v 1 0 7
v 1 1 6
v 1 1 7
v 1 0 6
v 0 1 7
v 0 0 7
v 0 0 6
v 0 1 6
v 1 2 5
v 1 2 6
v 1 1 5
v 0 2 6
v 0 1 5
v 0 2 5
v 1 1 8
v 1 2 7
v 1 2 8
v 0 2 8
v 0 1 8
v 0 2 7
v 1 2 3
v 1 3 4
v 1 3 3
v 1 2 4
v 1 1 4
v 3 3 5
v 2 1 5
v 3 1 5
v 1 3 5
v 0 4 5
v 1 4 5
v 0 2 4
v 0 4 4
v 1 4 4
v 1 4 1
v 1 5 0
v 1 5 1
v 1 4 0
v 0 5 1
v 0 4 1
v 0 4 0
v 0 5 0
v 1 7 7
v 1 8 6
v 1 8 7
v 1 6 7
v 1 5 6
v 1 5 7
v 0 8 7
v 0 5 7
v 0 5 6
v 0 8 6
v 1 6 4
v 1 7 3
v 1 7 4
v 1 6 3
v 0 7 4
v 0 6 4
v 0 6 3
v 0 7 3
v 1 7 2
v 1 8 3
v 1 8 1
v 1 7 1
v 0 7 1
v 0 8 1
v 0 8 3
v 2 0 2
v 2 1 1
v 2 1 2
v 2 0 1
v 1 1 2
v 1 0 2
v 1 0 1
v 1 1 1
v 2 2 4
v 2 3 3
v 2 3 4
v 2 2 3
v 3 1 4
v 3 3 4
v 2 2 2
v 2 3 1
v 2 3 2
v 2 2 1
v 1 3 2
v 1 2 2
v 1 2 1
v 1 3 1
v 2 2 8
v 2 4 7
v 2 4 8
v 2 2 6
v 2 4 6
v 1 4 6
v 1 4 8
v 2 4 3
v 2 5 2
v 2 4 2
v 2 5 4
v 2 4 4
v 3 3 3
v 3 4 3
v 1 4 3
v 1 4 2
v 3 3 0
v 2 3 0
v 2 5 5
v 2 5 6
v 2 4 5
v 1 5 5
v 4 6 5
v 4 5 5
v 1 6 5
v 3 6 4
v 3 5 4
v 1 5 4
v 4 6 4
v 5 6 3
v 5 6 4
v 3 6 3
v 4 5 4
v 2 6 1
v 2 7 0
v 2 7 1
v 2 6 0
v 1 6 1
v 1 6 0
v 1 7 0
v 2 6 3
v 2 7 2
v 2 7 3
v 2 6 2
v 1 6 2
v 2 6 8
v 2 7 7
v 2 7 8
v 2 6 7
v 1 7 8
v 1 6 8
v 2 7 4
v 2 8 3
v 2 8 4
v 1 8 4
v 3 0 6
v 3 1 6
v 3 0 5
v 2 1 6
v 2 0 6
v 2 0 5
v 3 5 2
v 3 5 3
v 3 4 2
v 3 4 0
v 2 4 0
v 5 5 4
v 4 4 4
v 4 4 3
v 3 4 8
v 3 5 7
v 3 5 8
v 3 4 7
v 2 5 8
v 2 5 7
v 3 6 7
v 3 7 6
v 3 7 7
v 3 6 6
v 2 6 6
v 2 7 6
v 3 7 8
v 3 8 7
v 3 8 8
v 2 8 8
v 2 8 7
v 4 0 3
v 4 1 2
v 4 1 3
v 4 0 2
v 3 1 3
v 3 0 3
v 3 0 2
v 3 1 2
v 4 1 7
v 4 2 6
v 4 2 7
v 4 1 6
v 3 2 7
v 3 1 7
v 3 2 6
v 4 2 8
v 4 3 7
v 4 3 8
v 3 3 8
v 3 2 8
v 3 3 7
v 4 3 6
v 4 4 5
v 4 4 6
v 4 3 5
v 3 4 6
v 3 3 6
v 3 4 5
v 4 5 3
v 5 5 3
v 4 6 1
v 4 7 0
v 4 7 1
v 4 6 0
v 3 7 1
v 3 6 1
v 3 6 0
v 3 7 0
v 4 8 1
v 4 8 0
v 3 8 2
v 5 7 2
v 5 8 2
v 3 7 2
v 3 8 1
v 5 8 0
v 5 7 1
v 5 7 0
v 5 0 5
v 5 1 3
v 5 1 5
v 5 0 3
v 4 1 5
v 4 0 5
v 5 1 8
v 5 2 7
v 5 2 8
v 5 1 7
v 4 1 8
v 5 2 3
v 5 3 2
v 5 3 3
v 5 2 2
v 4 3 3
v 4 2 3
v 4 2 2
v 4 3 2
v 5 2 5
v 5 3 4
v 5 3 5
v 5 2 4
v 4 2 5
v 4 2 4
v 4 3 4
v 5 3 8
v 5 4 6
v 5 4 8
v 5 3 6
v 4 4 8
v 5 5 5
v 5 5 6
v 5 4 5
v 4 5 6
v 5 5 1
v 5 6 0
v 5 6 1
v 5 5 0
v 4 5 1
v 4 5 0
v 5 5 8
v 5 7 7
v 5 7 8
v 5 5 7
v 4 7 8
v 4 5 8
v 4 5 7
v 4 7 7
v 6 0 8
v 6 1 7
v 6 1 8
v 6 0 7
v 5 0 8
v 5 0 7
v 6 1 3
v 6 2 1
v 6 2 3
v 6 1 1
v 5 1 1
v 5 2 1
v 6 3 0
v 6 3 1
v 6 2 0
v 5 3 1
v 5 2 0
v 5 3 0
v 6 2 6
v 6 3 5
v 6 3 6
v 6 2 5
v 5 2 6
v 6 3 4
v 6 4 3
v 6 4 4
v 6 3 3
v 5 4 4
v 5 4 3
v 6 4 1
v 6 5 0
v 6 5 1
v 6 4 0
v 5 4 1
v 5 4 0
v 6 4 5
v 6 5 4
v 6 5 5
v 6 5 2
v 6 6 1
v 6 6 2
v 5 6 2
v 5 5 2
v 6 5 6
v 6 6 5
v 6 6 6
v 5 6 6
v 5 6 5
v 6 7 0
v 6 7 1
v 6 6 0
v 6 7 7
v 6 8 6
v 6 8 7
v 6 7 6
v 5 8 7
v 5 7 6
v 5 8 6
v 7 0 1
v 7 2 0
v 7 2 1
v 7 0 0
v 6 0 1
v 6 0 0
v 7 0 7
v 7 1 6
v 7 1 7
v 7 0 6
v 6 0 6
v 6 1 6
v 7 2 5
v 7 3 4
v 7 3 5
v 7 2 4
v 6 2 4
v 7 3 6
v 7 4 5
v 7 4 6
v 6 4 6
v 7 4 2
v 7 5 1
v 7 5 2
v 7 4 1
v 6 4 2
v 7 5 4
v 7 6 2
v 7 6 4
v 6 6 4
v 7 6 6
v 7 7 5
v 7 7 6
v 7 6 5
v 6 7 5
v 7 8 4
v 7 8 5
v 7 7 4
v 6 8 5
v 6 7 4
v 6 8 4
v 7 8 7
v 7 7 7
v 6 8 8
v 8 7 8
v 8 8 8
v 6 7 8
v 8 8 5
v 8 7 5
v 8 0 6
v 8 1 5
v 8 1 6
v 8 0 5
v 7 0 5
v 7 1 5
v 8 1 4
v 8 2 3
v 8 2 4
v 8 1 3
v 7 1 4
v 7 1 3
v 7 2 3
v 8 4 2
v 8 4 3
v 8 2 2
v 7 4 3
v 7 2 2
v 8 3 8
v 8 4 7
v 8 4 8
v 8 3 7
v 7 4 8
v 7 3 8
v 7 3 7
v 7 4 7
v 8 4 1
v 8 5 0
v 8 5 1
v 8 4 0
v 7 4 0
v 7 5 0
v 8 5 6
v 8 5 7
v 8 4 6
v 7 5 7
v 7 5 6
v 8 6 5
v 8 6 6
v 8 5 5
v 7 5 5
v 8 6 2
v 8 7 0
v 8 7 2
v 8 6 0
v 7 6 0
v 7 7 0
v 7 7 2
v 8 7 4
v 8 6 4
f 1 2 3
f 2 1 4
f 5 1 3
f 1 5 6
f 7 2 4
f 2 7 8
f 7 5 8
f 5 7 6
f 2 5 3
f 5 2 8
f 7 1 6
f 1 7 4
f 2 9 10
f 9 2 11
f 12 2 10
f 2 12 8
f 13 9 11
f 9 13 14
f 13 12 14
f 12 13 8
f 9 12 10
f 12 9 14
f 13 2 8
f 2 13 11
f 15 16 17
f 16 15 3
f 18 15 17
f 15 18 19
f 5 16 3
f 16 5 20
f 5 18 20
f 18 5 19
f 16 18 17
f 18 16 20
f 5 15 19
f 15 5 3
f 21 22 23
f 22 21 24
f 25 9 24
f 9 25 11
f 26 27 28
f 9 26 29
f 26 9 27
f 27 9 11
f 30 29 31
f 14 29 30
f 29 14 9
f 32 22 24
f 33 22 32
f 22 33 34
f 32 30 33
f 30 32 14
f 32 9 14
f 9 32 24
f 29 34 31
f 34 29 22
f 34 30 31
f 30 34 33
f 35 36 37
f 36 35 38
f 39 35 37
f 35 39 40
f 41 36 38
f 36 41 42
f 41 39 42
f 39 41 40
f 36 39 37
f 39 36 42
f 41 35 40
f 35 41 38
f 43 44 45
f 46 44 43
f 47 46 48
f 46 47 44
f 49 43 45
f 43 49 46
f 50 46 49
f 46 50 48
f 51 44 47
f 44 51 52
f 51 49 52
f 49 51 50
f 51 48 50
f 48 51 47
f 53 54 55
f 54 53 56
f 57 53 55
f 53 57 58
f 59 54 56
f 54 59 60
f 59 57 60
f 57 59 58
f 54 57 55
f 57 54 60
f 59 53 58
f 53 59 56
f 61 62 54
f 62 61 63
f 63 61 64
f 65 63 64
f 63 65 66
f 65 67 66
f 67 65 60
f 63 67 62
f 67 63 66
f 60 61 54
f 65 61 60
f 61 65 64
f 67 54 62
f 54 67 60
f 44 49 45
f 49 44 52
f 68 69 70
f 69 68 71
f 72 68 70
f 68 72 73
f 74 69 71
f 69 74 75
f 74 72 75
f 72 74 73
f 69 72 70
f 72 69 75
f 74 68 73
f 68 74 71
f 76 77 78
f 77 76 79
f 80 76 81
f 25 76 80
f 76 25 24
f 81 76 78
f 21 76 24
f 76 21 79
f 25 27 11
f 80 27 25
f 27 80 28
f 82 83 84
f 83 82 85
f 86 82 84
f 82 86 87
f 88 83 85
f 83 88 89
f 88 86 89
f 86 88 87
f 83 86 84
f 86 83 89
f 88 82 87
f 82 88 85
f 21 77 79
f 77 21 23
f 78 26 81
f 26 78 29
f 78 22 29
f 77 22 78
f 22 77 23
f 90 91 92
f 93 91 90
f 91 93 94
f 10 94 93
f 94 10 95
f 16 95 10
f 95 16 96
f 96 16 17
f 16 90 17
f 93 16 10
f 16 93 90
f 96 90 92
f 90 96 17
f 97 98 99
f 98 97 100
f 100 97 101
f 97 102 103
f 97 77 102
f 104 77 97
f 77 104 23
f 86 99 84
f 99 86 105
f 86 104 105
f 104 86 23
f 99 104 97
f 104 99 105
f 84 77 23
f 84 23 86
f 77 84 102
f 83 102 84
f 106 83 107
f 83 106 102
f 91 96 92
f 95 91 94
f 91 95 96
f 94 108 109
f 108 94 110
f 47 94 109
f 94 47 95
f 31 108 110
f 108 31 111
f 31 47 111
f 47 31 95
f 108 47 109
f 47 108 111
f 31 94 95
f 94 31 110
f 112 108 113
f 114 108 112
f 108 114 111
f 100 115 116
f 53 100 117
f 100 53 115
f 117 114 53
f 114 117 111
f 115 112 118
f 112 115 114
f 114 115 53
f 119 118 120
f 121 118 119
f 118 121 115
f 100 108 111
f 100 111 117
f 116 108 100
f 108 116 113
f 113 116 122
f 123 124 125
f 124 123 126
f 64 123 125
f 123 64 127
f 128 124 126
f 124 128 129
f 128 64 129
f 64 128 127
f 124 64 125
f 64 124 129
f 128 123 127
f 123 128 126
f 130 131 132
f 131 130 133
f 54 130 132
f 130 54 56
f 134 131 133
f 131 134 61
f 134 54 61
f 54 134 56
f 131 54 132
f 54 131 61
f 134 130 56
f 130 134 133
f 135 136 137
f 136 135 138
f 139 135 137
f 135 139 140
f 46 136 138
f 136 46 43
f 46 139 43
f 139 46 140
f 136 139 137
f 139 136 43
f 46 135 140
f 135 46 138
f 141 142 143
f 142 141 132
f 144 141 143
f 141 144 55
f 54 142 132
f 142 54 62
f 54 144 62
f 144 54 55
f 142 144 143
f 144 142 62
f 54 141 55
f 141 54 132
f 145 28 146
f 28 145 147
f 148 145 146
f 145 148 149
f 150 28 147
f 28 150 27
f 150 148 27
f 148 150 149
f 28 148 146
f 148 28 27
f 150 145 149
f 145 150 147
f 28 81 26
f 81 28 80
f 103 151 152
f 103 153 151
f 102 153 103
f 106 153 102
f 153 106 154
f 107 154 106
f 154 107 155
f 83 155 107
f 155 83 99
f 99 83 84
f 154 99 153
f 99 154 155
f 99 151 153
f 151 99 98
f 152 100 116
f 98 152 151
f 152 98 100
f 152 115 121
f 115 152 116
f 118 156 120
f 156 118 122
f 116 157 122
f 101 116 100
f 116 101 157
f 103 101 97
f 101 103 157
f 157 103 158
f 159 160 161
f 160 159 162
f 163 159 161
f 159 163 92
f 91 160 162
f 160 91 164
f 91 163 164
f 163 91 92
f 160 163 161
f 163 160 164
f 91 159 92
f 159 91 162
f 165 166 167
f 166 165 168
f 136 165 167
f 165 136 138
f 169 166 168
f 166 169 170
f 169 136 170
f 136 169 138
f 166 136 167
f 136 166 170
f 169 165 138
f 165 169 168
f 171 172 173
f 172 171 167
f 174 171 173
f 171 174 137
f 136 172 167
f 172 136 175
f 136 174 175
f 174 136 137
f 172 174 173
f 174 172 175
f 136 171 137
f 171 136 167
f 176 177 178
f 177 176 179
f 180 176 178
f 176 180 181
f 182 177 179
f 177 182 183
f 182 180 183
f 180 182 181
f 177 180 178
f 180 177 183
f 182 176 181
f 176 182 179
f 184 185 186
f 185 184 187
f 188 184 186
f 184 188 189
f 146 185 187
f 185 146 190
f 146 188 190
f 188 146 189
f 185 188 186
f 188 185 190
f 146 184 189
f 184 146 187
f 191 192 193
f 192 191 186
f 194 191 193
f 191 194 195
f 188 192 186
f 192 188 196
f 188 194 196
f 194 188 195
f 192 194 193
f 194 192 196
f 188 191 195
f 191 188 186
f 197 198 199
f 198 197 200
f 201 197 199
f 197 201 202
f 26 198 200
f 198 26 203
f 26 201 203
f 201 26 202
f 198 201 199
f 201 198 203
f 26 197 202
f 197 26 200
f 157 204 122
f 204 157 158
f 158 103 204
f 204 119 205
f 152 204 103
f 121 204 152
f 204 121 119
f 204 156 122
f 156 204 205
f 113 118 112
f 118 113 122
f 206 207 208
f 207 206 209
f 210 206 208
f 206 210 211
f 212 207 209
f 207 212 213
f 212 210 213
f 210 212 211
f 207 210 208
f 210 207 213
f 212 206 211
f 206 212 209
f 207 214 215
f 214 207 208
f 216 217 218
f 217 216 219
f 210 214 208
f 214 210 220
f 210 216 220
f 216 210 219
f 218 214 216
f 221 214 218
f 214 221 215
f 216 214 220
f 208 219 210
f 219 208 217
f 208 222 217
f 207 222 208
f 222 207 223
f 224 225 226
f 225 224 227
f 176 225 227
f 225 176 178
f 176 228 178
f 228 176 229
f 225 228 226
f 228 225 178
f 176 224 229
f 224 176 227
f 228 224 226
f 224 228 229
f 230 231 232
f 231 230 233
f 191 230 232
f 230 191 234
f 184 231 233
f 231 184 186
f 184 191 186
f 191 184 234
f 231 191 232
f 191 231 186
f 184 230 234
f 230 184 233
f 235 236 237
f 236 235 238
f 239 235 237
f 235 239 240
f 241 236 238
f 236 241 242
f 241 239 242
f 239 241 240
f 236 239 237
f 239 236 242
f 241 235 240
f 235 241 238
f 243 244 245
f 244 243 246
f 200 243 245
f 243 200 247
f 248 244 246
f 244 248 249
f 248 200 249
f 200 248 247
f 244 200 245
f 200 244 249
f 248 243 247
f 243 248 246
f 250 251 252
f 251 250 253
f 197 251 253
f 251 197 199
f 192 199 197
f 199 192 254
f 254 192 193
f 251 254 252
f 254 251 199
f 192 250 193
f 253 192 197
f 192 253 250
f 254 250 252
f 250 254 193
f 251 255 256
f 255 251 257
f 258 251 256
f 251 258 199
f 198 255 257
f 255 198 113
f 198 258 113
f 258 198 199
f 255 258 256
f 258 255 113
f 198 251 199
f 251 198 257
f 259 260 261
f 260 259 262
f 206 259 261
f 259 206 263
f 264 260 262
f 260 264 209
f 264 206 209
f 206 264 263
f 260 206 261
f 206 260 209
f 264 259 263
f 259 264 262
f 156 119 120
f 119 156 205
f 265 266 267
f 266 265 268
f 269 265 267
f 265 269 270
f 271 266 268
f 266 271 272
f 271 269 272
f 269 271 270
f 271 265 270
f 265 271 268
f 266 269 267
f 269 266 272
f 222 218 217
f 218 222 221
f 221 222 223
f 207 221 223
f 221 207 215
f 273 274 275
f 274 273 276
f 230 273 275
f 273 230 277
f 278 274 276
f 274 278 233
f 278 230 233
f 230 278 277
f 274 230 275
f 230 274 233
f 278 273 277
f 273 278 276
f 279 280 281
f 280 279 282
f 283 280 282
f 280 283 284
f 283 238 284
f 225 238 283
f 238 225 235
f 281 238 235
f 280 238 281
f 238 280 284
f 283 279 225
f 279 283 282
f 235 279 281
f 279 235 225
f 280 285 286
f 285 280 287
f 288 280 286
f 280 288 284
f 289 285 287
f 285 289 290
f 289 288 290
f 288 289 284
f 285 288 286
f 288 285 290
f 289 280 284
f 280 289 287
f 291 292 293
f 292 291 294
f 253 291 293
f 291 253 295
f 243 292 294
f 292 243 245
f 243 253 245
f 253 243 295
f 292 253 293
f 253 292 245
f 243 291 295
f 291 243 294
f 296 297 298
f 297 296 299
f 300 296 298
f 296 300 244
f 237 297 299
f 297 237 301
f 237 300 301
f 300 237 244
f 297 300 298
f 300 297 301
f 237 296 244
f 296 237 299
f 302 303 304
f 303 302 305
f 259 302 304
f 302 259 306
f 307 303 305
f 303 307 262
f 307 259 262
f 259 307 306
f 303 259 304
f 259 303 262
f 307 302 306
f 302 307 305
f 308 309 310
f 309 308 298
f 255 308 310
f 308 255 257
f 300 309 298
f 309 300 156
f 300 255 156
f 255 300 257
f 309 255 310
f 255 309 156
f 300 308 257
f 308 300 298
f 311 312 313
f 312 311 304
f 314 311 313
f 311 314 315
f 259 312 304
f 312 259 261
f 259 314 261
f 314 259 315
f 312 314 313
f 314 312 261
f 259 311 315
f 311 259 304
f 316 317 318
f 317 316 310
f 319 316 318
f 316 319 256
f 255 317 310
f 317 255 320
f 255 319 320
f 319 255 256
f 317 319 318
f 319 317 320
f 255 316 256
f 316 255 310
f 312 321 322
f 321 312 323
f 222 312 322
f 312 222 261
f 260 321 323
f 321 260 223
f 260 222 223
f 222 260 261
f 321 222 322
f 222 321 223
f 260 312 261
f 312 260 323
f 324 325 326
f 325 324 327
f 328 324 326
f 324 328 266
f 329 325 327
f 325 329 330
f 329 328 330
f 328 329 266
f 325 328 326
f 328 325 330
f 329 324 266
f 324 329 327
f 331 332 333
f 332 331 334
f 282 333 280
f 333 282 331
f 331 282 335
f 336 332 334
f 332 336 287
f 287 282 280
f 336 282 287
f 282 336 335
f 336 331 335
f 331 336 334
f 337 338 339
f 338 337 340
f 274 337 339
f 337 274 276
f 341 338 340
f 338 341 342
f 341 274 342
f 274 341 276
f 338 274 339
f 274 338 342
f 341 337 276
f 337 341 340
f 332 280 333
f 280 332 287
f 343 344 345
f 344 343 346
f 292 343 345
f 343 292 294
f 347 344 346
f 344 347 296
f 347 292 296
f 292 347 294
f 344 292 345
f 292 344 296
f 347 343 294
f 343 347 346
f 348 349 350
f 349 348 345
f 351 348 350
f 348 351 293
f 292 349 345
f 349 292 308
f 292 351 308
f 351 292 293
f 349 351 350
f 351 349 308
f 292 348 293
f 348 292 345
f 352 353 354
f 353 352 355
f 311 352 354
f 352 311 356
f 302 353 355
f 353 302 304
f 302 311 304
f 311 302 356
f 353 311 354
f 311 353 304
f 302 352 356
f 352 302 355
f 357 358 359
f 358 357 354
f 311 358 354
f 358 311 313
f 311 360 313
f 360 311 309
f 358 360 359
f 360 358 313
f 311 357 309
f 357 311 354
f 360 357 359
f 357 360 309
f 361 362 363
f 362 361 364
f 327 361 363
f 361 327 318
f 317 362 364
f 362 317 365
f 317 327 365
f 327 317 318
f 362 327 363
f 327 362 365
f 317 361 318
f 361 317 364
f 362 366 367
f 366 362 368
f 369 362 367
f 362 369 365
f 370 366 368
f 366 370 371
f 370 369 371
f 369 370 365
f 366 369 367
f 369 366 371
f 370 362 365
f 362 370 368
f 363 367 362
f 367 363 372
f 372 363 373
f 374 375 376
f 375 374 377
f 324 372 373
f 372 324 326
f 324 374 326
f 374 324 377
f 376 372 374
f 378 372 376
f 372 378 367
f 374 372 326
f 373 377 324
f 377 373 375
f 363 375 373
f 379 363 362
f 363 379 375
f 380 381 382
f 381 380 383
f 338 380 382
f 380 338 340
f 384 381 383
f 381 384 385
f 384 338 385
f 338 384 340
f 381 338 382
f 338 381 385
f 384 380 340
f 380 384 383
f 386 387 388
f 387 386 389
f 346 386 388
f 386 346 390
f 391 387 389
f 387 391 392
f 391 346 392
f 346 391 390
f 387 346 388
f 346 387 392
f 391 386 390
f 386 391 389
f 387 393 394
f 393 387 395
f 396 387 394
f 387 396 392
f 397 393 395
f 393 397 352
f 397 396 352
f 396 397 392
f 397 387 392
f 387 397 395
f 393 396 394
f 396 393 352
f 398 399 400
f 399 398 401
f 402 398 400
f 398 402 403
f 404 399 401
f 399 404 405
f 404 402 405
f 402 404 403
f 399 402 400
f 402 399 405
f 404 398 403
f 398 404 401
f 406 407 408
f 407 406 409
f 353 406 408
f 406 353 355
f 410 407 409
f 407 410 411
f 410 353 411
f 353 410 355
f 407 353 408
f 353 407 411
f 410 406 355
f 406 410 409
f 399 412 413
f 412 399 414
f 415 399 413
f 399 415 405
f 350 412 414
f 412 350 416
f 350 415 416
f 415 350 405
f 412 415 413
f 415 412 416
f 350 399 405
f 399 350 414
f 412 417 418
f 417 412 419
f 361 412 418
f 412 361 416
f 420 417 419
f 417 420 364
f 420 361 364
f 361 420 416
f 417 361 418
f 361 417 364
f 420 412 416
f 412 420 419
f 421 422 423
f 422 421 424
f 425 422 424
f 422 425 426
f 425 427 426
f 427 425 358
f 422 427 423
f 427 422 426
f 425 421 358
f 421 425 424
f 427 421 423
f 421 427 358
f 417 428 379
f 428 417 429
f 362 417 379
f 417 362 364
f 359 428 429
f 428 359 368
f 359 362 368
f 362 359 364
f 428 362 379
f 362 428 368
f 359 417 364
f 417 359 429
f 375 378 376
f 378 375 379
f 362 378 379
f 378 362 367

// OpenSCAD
union() {
    translate([0, 0, 6]) cube([1, 1, 1]);
    translate([0, 1, 5]) cube([1, 1, 1]);
    translate([0, 1, 7]) cube([1, 1, 1]);
    translate([0, 2, 4]) cube([1, 1, 1]);
    translate([0, 3, 4]) cube([1, 1, 1]);
    translate([0, 4, 0]) cube([1, 1, 1]);
    translate([0, 5, 6]) cube([1, 1, 1]);
    translate([0, 6, 3]) cube([1, 1, 1]);
    translate([0, 6, 6]) cube([1, 1, 1]);
    translate([0, 7, 1]) cube([1, 1, 1]);
    translate([0, 7, 2]) cube([1, 1, 1]);
    translate([0, 7, 6]) cube([1, 1, 1]);
    translate([1, 0, 1]) cube([1, 1, 1]);
    translate([1, 1, 4]) cube([1, 1, 1]);
    translate([1, 2, 1]) cube([1, 1, 1]);
    translate([1, 2, 3]) cube([1, 1, 1]);
    translate([1, 2, 4]) cube([1, 1, 1]);
    translate([1, 2, 6]) cube([1, 1, 1]);
    translate([1, 2, 7]) cube([1, 1, 1]);
    translate([1, 3, 2]) cube([1, 1, 1]);
    translate([1, 3, 6]) cube([1, 1, 1]);
    translate([1, 3, 7]) cube([1, 1, 1]);
    translate([1, 4, 5]) cube([1, 1, 1]);
    translate([1, 5, 4]) cube([1, 1, 1]);
    translate([1, 6, 0]) cube([1, 1, 1]);
    translate([1, 6, 2]) cube([1, 1, 1]);
    translate([1, 6, 7]) cube([1, 1, 1]);
    translate([1, 7, 3]) cube([1, 1, 1]);
    translate([2, 0, 5]) cube([1, 1, 1]);
    translate([2, 1, 4]) cube([1, 1, 1]);
    translate([2, 2, 4]) cube([1, 1, 1]);
    translate([2, 3, 0]) cube([1, 1, 1]);
    translate([2, 3, 1]) cube([1, 1, 1]);
    translate([2, 3, 2]) cube([1, 1, 1]);
    translate([2, 4, 2]) cube([1, 1, 1]);
    translate([2, 4, 3]) cube([1, 1, 1]);
    translate([2, 4, 7]) cube([1, 1, 1]);
    translate([2, 5, 4]) cube([1, 1, 1]);
    translate([2, 6, 6]) cube([1, 1, 1]);
    translate([2, 7, 7]) cube([1, 1, 1]);
    translate([3, 0, 2]) cube([1, 1, 1]);
    translate([3, 1, 6]) cube([1, 1, 1]);
    translate([3, 2, 7]) cube([1, 1, 1]);
    translate([3, 3, 5]) cube([1, 1, 1]);
    translate([3, 4, 3]) cube([1, 1, 1]);
    translate([3, 5, 3]) cube([1, 1, 1]);
    translate([3, 5, 4]) cube([1, 1, 1]);
    translate([3, 6, 0]) cube([1, 1, 1]);
    translate([3, 7, 1]) cube([1, 1, 1]);
    translate([4, 0, 3]) cube([1, 1, 1]);
    translate([4, 0, 4]) cube([1, 1, 1]);
    translate([4, 1, 7]) cube([1, 1, 1]);
    translate([4, 2, 2]) cube([1, 1, 1]);
    translate([4, 2, 4]) cube([1, 1, 1]);
    translate([4, 3, 6]) cube([1, 1, 1]);
    translate([4, 3, 7]) cube([1, 1, 1]);
    translate([4, 4, 5]) cube([1, 1, 1]);
    translate([4, 5, 0]) cube([1, 1, 1]);
    translate([4, 5, 3]) cube([1, 1, 1]);
    translate([4, 5, 7]) cube([1, 1, 1]);
    translate([4, 6, 7]) cube([1, 1, 1]);
    translate([4, 7, 0]) cube([1, 1, 1]);
    translate([4, 7, 1]) cube([1, 1, 1]);
    translate([5, 0, 7]) cube([1, 1, 1]);
    translate([5, 1, 1]) cube([1, 1, 1]);
    translate([5, 1, 2]) cube([1, 1, 1]);
    translate([5, 2, 0]) cube([1, 1, 1]);
    translate([5, 2, 5]) cube([1, 1, 1]);
    translate([5, 3, 3]) cube([1, 1, 1]);
    translate([5, 4, 0]) cube([1, 1, 1]);
    translate([5, 4, 4]) cube([1, 1, 1]);
    translate([5, 5, 1]) cube([1, 1, 1]);
    translate([5, 5, 5]) cube([1, 1, 1]);
    translate([5, 6, 0]) cube([1, 1, 1]);
    translate([5, 7, 6]) cube([1, 1, 1]);
    translate([6, 0, 0]) cube([1, 1, 1]);
    translate([6, 0, 6]) cube([1, 1, 1]);
    translate([6, 1, 0]) cube([1, 1, 1]);
    translate([6, 2, 4]) cube([1, 1, 1]);
    translate([6, 3, 5]) cube([1, 1, 1]);
    translate([6, 4, 1]) cube([1, 1, 1]);
    translate([6, 5, 2]) cube([1, 1, 1]);
    translate([6, 5, 3]) cube([1, 1, 1]);
    translate([6, 6, 5]) cube([1, 1, 1]);
    translate([6, 7, 4]) cube([1, 1, 1]);
    translate([6, 7, 7]) cube([1, 1, 1]);
    translate([7, 0, 5]) cube([1, 1, 1]);
    translate([7, 1, 3]) cube([1, 1, 1]);
    translate([7, 2, 2]) cube([1, 1, 1]);
    translate([7, 3, 2]) cube([1, 1, 1]);
    translate([7, 3, 7]) cube([1, 1, 1]);
    translate([7, 4, 0]) cube([1, 1, 1]);
    translate([7, 4, 6]) cube([1, 1, 1]);
    translate([7, 5, 5]) cube([1, 1, 1]);
    translate([7, 6, 0]) cube([1, 1, 1]);
    translate([7, 6, 1]) cube([1, 1, 1]);
    translate([7, 6, 4]) cube([1, 1, 1]);
    translate([7, 7, 5]) cube([1, 1, 1]);
    translate([7, 7, 6]) cube([1, 1, 1]);
    translate([7, 7, 7]) cube([1, 1, 1]);
}
